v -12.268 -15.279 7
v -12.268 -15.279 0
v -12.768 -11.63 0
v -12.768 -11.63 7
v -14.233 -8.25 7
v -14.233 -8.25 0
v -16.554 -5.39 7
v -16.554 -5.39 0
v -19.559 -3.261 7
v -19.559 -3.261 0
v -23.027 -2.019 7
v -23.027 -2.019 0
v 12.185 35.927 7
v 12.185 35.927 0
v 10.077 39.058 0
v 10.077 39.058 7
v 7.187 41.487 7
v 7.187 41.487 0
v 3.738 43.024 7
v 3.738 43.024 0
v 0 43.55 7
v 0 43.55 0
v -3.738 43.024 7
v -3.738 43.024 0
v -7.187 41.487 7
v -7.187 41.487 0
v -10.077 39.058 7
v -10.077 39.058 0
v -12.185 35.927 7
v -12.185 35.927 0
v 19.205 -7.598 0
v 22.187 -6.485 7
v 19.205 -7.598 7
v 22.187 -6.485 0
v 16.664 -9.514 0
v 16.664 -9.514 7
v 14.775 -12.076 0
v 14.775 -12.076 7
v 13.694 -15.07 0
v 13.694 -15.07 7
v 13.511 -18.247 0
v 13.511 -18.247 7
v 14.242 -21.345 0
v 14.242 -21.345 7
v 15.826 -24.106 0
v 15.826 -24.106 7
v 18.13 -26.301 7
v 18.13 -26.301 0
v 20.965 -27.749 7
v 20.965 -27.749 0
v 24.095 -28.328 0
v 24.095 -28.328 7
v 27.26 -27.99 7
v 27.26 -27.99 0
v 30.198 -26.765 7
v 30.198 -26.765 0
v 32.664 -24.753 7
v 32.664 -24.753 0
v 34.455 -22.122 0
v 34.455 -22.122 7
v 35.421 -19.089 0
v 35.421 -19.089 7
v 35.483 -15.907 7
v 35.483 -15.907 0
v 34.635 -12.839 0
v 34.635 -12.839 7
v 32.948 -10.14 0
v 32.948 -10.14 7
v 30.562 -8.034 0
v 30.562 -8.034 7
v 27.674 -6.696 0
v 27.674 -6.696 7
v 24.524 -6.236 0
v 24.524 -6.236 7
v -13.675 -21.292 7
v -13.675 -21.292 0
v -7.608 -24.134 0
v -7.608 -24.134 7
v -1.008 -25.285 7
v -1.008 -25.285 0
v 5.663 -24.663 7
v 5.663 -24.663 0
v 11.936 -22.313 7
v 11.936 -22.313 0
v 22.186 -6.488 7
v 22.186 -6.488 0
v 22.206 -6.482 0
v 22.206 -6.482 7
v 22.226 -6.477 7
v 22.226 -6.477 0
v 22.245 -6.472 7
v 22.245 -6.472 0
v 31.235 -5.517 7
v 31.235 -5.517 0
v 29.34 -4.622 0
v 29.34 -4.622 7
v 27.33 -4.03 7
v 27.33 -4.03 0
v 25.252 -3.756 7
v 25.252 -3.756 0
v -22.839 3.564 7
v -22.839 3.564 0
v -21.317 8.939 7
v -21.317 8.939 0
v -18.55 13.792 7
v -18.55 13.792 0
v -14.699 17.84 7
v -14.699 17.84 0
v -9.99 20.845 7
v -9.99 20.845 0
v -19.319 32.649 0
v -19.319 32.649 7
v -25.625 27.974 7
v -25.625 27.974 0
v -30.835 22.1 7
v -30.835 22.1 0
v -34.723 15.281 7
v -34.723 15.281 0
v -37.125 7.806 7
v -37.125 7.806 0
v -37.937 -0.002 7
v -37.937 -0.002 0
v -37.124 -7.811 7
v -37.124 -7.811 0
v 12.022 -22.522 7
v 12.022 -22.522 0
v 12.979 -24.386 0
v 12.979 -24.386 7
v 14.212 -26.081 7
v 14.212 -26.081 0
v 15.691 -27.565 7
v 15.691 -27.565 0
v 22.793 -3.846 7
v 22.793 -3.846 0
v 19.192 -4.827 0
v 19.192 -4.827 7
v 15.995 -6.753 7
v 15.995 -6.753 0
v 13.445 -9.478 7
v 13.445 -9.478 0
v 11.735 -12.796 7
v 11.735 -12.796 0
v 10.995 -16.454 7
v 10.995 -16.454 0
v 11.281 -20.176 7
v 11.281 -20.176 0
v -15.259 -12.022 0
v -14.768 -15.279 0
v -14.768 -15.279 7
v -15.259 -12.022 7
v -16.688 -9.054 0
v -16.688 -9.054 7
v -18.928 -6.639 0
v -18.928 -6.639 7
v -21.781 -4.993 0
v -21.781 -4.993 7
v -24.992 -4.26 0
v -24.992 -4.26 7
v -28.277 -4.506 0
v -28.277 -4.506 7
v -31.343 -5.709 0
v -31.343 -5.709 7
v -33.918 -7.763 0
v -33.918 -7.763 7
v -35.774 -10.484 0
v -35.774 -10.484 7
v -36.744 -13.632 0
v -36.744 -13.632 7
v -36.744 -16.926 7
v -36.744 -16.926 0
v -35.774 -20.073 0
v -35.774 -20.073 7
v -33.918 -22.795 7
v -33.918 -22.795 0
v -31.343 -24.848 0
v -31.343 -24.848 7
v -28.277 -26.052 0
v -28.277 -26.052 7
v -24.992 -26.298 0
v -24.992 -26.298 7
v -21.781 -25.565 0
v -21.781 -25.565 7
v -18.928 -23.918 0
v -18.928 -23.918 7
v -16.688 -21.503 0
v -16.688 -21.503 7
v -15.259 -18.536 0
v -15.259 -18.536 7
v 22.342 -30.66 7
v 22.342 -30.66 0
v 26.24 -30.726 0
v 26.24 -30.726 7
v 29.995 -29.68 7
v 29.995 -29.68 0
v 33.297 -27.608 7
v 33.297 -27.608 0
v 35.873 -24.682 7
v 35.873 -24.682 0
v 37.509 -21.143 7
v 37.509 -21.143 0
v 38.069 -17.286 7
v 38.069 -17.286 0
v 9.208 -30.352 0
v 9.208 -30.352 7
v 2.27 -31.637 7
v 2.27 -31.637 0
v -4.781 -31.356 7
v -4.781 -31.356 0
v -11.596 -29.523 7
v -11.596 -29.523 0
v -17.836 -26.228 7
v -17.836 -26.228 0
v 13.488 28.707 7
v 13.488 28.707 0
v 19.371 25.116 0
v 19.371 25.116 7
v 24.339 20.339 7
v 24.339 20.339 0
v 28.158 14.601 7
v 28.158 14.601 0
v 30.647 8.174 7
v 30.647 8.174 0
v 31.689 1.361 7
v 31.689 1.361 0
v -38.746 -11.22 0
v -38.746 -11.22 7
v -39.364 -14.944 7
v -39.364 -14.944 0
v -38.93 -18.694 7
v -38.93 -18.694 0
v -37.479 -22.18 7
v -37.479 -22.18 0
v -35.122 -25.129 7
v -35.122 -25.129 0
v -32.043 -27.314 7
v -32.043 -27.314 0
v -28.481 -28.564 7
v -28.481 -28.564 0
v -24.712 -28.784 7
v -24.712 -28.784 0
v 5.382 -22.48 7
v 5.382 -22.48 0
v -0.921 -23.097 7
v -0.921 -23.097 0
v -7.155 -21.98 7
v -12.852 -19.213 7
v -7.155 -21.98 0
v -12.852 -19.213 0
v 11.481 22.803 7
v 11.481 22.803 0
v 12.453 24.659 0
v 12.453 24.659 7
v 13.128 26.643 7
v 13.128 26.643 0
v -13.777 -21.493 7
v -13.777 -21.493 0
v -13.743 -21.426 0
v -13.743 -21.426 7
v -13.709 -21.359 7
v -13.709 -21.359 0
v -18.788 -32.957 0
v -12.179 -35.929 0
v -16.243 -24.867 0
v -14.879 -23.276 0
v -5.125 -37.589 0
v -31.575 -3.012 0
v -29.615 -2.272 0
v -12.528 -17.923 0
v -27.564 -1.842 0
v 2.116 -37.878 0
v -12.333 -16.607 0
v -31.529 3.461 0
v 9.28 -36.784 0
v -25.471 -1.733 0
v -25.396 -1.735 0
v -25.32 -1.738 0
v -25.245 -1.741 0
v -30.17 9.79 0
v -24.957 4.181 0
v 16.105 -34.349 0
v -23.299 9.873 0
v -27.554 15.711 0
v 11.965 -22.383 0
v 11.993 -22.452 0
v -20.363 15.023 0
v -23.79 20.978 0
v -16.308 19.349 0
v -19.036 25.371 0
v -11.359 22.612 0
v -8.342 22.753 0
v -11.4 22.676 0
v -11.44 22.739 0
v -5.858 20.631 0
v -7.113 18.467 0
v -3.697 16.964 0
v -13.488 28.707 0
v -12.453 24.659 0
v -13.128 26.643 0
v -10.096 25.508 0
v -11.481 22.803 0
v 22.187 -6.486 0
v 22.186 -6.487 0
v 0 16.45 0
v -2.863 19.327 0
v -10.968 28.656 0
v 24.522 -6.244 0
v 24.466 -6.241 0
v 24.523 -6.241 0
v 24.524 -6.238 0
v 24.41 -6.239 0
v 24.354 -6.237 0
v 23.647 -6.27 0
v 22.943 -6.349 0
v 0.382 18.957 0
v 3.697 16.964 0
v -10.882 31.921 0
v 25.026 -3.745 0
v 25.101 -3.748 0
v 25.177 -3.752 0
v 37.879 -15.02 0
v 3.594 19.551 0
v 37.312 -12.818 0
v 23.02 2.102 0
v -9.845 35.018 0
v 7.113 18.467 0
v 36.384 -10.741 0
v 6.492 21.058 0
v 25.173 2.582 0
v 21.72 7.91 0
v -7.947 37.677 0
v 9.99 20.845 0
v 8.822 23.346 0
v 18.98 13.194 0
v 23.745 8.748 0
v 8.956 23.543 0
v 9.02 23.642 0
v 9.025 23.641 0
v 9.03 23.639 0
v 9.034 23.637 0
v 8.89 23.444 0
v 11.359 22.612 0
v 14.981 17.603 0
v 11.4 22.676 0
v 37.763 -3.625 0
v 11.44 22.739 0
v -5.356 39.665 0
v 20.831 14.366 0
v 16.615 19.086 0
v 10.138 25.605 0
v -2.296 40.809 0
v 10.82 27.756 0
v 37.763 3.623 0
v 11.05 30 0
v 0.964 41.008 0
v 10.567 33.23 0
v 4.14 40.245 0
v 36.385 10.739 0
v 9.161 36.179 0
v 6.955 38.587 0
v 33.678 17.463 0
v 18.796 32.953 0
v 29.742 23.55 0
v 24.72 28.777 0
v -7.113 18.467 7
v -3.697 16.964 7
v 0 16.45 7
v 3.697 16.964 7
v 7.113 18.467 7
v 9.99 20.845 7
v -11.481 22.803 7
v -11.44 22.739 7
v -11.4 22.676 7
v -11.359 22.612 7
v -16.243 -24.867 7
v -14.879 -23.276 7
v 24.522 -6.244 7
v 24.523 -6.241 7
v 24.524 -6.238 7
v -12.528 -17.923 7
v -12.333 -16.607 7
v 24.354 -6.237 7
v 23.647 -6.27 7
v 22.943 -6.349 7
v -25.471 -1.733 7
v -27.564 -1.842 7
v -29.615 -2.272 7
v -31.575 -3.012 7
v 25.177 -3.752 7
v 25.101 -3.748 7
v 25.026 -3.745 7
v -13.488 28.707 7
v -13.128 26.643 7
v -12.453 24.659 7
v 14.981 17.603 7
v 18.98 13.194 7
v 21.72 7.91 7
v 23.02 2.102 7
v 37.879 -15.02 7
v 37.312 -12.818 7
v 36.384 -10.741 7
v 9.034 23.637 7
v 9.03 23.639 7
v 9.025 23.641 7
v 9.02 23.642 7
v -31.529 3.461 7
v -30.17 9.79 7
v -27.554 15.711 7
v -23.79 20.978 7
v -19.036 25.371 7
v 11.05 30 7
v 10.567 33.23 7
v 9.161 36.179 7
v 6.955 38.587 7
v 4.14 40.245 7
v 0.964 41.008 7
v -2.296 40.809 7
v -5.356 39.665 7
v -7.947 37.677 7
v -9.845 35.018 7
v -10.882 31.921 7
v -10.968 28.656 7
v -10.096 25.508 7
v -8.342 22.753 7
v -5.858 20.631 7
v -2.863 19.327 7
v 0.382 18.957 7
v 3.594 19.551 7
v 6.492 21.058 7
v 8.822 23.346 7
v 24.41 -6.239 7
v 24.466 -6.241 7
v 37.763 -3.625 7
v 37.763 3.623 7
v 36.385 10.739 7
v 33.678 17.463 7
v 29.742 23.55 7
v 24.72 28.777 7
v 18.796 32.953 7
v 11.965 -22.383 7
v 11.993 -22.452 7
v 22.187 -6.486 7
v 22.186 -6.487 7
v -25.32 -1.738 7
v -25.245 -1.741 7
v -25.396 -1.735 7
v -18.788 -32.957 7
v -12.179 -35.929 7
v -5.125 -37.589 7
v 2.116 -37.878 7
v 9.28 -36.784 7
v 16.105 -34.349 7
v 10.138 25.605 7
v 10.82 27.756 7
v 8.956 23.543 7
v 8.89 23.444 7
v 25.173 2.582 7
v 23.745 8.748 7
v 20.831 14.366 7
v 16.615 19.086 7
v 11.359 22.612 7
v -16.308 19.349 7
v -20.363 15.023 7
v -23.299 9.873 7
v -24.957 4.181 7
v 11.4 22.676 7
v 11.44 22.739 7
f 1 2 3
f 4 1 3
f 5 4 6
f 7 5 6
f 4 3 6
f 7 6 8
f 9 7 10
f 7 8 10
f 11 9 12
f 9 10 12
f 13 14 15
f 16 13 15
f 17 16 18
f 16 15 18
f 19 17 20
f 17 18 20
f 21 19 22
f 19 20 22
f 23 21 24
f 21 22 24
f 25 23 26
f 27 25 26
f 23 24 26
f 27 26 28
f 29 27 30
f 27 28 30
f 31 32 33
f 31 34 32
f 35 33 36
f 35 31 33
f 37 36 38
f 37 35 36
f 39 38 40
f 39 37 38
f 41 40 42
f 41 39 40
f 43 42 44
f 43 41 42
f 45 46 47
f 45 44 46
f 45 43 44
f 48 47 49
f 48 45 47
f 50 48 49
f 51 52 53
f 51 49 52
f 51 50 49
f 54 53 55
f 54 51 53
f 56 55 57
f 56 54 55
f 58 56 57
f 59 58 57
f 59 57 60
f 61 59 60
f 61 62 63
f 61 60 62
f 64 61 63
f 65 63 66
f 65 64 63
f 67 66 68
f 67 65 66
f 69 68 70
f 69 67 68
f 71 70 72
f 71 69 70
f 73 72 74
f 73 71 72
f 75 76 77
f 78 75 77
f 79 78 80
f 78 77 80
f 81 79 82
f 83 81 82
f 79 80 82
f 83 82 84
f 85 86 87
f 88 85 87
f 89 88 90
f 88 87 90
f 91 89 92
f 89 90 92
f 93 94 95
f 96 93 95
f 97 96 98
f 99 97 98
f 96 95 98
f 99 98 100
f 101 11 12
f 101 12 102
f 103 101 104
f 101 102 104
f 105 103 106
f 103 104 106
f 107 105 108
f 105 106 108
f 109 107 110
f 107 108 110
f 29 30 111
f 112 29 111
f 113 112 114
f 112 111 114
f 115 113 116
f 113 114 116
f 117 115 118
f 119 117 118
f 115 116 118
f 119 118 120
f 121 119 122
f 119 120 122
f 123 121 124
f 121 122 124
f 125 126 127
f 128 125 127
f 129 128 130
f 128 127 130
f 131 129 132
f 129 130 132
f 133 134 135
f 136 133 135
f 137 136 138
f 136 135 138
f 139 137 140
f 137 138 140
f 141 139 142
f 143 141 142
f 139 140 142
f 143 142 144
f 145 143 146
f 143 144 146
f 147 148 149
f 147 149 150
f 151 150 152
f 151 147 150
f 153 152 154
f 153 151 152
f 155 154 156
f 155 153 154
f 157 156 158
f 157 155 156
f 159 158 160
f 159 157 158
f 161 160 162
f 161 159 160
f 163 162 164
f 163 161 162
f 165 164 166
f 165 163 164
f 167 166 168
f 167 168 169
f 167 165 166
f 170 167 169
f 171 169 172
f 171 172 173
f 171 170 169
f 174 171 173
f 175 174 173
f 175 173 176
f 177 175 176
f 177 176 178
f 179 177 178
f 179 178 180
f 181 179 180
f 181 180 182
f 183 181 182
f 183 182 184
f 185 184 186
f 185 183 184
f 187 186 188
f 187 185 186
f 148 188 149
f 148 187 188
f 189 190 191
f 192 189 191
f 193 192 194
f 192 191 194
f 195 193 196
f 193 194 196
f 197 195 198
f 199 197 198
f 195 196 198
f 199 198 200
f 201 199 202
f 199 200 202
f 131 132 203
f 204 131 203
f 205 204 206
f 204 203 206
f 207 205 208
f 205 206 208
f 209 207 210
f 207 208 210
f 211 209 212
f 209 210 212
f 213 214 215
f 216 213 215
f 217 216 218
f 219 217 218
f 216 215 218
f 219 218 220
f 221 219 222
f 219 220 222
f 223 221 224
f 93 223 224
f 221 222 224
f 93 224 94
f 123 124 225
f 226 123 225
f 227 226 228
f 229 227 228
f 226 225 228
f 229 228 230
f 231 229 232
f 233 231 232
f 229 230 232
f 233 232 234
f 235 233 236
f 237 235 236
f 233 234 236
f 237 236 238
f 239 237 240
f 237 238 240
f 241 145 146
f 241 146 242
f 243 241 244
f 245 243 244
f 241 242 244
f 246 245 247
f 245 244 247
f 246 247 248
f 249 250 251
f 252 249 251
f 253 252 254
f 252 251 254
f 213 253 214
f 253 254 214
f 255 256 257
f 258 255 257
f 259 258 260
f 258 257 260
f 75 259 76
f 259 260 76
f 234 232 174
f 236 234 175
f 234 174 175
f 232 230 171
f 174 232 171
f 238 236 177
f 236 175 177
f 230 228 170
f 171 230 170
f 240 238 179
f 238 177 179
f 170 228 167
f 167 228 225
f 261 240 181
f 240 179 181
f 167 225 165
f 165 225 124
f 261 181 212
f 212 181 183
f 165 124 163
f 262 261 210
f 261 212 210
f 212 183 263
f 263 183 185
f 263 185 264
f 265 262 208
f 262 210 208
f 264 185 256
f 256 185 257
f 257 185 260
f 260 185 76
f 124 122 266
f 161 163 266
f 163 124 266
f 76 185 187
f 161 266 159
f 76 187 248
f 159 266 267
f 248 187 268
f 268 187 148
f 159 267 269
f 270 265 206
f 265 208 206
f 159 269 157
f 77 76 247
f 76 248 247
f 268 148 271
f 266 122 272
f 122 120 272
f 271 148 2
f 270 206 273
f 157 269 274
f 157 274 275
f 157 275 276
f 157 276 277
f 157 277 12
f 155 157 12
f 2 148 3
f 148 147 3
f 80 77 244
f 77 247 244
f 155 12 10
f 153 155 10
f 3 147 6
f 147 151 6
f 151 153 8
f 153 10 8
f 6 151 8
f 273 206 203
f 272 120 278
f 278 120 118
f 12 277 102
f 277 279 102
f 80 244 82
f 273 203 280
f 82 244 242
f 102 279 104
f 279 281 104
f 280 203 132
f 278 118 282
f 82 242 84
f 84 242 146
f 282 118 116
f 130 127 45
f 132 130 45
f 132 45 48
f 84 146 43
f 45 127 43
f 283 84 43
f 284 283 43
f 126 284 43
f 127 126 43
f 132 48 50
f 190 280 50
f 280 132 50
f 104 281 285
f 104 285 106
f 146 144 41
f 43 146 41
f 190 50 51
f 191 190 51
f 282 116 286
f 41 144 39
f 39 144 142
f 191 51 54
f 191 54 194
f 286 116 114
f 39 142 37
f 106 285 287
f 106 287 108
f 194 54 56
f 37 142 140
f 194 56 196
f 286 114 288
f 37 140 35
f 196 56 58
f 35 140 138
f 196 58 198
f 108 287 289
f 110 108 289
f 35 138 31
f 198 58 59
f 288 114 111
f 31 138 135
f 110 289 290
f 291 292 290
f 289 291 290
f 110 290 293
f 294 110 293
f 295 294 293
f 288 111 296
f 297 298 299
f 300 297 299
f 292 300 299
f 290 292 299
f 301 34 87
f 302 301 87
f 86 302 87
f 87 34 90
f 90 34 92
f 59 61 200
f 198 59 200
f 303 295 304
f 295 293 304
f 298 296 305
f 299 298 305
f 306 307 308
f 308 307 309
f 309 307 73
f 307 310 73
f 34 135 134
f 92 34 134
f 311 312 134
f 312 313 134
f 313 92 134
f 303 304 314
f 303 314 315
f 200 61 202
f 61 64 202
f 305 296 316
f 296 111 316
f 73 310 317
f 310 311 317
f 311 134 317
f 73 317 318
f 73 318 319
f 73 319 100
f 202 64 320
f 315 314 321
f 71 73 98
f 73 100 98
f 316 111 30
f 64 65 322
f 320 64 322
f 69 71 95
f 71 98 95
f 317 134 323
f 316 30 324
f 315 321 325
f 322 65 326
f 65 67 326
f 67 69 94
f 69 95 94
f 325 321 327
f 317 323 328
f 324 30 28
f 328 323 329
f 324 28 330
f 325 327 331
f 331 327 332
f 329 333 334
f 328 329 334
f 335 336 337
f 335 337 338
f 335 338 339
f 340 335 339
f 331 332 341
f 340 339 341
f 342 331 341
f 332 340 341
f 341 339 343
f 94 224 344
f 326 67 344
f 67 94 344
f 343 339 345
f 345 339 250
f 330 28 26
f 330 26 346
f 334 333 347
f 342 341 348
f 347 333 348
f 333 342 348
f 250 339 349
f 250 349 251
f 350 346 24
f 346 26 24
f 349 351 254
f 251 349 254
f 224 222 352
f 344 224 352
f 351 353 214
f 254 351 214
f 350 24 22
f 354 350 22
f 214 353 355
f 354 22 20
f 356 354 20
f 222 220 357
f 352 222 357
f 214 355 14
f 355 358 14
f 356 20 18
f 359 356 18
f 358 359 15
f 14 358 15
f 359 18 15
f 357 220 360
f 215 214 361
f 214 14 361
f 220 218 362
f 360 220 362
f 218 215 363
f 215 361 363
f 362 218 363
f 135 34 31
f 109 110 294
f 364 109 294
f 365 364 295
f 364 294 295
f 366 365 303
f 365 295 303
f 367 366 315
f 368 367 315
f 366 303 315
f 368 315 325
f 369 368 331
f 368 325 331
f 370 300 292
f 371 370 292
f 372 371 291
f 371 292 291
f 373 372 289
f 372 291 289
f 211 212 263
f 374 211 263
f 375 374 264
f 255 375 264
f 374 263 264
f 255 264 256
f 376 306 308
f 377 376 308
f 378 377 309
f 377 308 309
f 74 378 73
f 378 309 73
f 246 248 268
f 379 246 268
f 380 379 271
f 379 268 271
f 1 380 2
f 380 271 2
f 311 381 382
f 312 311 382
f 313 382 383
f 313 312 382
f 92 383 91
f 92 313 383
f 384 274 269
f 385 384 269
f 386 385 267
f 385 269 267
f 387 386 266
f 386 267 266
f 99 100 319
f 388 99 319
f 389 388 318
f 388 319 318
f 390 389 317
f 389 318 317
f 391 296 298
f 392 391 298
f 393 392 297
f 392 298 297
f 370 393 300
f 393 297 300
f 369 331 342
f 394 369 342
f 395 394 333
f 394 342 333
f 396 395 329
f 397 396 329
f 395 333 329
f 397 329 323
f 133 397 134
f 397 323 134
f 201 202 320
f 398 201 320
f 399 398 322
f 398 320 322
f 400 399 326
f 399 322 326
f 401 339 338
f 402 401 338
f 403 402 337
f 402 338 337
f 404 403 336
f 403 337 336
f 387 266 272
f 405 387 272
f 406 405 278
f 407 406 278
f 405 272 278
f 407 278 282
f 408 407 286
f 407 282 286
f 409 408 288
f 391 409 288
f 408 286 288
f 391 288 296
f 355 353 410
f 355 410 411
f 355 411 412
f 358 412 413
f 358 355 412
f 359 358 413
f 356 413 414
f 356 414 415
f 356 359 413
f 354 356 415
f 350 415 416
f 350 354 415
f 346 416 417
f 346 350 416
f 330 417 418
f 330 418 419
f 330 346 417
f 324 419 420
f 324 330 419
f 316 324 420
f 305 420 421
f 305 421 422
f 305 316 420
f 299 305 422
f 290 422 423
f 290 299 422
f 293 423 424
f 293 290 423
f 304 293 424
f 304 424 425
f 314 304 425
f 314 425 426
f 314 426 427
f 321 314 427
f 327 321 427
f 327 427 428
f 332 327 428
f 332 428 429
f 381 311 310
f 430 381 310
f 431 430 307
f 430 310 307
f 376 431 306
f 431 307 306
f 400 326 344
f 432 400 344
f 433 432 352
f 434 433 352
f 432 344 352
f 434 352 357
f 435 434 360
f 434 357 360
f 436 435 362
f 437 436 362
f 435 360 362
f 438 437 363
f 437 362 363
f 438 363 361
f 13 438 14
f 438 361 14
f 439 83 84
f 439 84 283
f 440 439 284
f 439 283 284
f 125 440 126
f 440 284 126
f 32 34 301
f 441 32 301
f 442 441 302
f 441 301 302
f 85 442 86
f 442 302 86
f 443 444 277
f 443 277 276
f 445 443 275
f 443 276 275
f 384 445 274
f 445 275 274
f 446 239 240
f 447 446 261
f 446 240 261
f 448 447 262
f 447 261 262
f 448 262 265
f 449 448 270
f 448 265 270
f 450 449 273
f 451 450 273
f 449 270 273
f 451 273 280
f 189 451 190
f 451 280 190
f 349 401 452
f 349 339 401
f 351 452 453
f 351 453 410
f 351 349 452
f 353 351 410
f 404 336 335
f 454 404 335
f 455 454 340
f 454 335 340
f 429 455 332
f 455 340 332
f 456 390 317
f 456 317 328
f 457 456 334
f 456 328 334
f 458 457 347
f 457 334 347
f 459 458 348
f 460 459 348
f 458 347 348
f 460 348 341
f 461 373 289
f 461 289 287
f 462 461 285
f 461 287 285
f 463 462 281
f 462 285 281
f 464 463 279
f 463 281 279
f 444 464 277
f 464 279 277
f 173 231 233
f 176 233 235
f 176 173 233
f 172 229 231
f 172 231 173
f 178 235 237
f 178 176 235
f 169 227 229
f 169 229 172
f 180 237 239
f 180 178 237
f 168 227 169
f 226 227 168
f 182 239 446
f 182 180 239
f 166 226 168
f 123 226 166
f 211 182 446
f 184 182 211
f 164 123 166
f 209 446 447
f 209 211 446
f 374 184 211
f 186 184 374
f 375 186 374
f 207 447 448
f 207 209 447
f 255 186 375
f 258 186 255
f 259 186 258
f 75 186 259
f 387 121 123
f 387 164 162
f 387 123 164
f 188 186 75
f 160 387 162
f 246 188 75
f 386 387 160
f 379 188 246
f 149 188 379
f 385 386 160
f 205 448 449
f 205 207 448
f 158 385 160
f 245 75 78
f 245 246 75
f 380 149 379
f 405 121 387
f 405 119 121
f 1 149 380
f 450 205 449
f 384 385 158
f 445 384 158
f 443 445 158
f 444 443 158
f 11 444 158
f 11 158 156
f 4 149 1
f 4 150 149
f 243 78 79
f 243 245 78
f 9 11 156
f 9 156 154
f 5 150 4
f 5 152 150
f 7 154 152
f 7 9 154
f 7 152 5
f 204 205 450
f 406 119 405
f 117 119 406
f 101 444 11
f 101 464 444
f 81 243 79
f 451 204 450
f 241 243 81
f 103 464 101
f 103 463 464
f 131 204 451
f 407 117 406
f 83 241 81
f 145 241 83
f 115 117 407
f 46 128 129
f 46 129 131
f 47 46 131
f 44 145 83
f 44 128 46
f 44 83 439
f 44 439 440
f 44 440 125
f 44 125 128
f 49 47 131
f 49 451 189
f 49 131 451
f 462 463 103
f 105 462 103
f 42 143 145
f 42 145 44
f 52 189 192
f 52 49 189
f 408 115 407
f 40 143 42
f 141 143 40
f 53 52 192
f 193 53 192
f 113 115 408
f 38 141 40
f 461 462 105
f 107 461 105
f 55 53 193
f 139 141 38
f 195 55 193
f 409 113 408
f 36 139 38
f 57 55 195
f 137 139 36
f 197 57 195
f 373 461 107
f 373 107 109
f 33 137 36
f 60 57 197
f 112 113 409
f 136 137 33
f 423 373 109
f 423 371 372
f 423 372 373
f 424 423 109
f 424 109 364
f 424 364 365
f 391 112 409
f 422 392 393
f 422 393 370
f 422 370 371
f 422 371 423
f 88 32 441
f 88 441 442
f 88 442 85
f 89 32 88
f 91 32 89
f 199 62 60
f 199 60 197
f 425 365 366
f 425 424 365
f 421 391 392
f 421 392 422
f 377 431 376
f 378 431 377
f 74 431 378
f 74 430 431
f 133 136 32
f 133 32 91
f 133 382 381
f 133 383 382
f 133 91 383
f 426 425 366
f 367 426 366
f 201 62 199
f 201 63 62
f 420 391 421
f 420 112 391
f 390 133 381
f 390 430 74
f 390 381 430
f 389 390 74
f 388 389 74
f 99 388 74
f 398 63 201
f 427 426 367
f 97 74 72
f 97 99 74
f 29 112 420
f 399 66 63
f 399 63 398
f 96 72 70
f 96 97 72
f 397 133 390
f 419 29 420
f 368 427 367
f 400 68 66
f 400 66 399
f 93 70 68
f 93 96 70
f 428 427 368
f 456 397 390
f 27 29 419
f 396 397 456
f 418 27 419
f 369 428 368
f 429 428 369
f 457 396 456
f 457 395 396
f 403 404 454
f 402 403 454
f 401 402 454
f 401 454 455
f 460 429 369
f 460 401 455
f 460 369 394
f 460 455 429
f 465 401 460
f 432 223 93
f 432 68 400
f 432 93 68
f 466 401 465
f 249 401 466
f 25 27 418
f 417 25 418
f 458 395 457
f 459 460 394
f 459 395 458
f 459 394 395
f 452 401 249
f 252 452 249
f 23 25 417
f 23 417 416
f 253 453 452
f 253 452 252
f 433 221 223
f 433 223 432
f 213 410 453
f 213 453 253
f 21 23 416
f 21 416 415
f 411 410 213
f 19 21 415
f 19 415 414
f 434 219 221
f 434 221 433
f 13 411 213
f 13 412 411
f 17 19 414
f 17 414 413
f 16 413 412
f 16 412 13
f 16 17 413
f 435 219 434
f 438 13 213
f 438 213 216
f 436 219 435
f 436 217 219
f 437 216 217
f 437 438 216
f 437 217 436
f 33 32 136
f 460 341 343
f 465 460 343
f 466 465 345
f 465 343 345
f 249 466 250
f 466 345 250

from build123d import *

# Parameters (mm, degrees)
F0_R     = 11.05
F1_DEPTH = 7
F3_DEPTH = 7
F4_DEPTH = 7


with BuildPart() as f1:
    # F0 (on Top) → F1 (new body)
    with BuildSketch(Plane.XY):
        with BuildLine():
            ThreePointArc((13.488193, 28.70727), (13.534539, 29.352897), (13.55, 30))
            ThreePointArc((13.55, 30), (13.20438, 33.040864), (12.185151, 35.9266))
            ThreePointArc((12.185151, 35.9266), (0, 43.55), (-12.185151, 35.9266))
            ThreePointArc((-12.185151, 35.9266), (-13.334535, 32.406796), (-13.488193, 28.70727))
            ThreePointArc((-13.488193, 28.70727), (-12.828695, 25.637996), (-11.480581, 22.802865))
            ThreePointArc((-11.480581, 22.802865), (0, 16.45), (11.480581, 22.802865))
            ThreePointArc((11.480581, 22.802865), (12.828695, 25.637996), (13.488193, 28.70727))
        make_face()
        with Locations((0, 30)):
            Circle(F0_R, mode=Mode.SUBTRACT)
        with BuildLine():
            ThreePointArc((12.185151, 35.9266), (13.20438, 33.040864), (13.55, 30))
            ThreePointArc((13.55, 30), (13.534539, 29.352897), (13.488193, 28.70727))
            ThreePointArc((13.488193, 28.70727), (28.157661, 14.60085), (31.234669, -5.516715))
            ThreePointArc((31.234669, -5.516715), (34.169815, -7.77393), (36.384345, -10.741415))
            ThreePointArc((36.384345, -10.741415), (33.678256, 17.463494), (12.185151, 35.9266))
        make_face()
        with BuildLine():
            ThreePointArc((-13.488193, 28.70727), (-13.334535, 32.406796), (-12.185151, 35.9266))
            ThreePointArc((-12.185151, 35.9266), (-32.955792, 18.791336), (-37.124024, -7.810595))
            ThreePointArc((-37.124024, -7.810595), (-34.680269, -5.028838), (-31.574733, -3.012468))
            ThreePointArc((-31.574733, -3.012468), (-27.553625, 15.711029), (-13.488193, 28.70727))
        make_face()
        with BuildLine():
            ThreePointArc((38.069481, -17.285689), (37.641436, -13.906813), (36.384345, -10.741415))
            ThreePointArc((36.384345, -10.741415), (34.169815, -7.77393), (31.234669, -5.516715))
            ThreePointArc((31.234669, -5.516715), (28.346106, -4.287249), (25.252139, -3.755511))
            ThreePointArc((25.252139, -3.755511), (13.444849, -9.478319), (12.022155, -22.522037))
            ThreePointArc((12.022155, -22.522037), (13.562584, -25.257446), (15.691155, -27.564948))
            ThreePointArc((15.691155, -27.564948), (18.803373, -29.57099), (22.342429, -30.659654))
            ThreePointArc((22.342429, -30.659654), (33.297392, -27.608033), (38.069481, -17.285689))
        make_face()
        with Locations((24.519481, -17.285689)):
            Circle(F0_R, mode=Mode.SUBTRACT)
        with BuildLine():
            ThreePointArc((-31.574733, -3.012468), (-34.680269, -5.028838), (-37.124024, -7.810595))
            ThreePointArc((-37.124024, -7.810595), (-37.478901, -22.179596), (-24.712464, -28.783549))
            ThreePointArc((-24.712464, -28.783549), (-21.097968, -27.9801), (-17.835919, -26.228204))
            ThreePointArc((-17.835919, -26.228204), (-15.530394, -24.097492), (-13.777076, -21.493407))
            ThreePointArc((-13.777076, -21.493407), (-12.650556, -18.476376), (-12.267842, -15.278711))
            ThreePointArc((-12.267842, -15.278711), (-16.114684, -5.820845), (-25.470975, -1.733152))
            ThreePointArc((-25.470975, -1.733152), (-28.597456, -2.016877), (-31.574733, -3.012468))
        make_face()
        with Locations((-25.817842, -15.278711)):
            Circle(F0_R, mode=Mode.SUBTRACT)
        with BuildLine():
            ThreePointArc((-17.835919, -26.228204), (-21.097968, -27.9801), (-24.712464, -28.783549))
            ThreePointArc((-24.712464, -28.783549), (-1.51136, -37.906653), (22.342429, -30.659654))
            ThreePointArc((22.342429, -30.659654), (18.803373, -29.57099), (15.691155, -27.564948))
            ThreePointArc((15.691155, -27.564948), (-1.263615, -31.692933), (-17.835919, -26.228204))
        make_face()
    extrude(amount=F1_DEPTH)

    # F2 (on Top) → F3 (join)
    with BuildSketch(Plane.XY):
        with BuildLine():
            ThreePointArc((22.186179, -6.487718), (23.344779, -6.274527), (24.522428, -6.243789))
            ThreePointArc((24.522428, -6.243789), (22.462795, 11.65149), (9.020363, 23.642493))
            ThreePointArc((9.020363, 23.642493), (8.320455, 22.700455), (7.494648, 21.866579))
            ThreePointArc((7.494648, 21.866579), (20.523874, 10.634266), (22.186179, -6.487718))
        make_face()
        with BuildLine():
            ThreePointArc((13.539374, -18.735057), (-0.928614, -23.096638), (-14.999749, -17.587624))
            ThreePointArc((-14.999749, -17.587624), (-15.236978, -18.747162), (-15.725852, -19.825034))
            ThreePointArc((-15.725852, -19.825034), (-1.000586, -25.28504), (14.110088, -21.005709))
            ThreePointArc((14.110088, -21.005709), (13.711284, -19.898897), (13.539374, -18.735057))
        make_face()
        with BuildLine():
            ThreePointArc((-22.652675, -4.60145), (-20.066421, 11.474134), (-7.523773, 21.856575))
            ThreePointArc((-7.523773, 21.856575), (-8.361476, 22.681537), (-9.059772, 23.627419))
            ThreePointArc((-9.059772, 23.627419), (-21.948573, 12.593433), (-24.970128, -4.102083))
            Line((-24.970128, -4.102083), (-22.652675, -4.60145))
        make_face()
    extrude(amount=F3_DEPTH)

    # F2 (on Top) → F4 (join)
    with BuildSketch(Plane.XY):
        with BuildLine():
            ThreePointArc((22.186179, -6.487718), (23.344779, -6.274527), (24.522428, -6.243789))
            ThreePointArc((24.522428, -6.243789), (22.462795, 11.65149), (9.020363, 23.642493))
            ThreePointArc((9.020363, 23.642493), (8.320455, 22.700455), (7.494648, 21.866579))
            ThreePointArc((7.494648, 21.866579), (20.523874, 10.634266), (22.186179, -6.487718))
        make_face()
        with BuildLine():
            ThreePointArc((13.539374, -18.735057), (-0.928614, -23.096638), (-14.999749, -17.587624))
            ThreePointArc((-14.999749, -17.587624), (-15.236978, -18.747162), (-15.725852, -19.825034))
            ThreePointArc((-15.725852, -19.825034), (-1.000586, -25.28504), (14.110088, -21.005709))
            ThreePointArc((14.110088, -21.005709), (13.711284, -19.898897), (13.539374, -18.735057))
        make_face()
        with BuildLine():
            ThreePointArc((-22.652675, -4.60145), (-20.066421, 11.474134), (-7.523773, 21.856575))
            ThreePointArc((-7.523773, 21.856575), (-8.361476, 22.681537), (-9.059772, 23.627419))
            ThreePointArc((-9.059772, 23.627419), (-21.948573, 12.593433), (-24.970128, -4.102083))
            Line((-24.970128, -4.102083), (-22.652675, -4.60145))
        make_face()
    extrude(amount=F4_DEPTH)


solid = f1.part
